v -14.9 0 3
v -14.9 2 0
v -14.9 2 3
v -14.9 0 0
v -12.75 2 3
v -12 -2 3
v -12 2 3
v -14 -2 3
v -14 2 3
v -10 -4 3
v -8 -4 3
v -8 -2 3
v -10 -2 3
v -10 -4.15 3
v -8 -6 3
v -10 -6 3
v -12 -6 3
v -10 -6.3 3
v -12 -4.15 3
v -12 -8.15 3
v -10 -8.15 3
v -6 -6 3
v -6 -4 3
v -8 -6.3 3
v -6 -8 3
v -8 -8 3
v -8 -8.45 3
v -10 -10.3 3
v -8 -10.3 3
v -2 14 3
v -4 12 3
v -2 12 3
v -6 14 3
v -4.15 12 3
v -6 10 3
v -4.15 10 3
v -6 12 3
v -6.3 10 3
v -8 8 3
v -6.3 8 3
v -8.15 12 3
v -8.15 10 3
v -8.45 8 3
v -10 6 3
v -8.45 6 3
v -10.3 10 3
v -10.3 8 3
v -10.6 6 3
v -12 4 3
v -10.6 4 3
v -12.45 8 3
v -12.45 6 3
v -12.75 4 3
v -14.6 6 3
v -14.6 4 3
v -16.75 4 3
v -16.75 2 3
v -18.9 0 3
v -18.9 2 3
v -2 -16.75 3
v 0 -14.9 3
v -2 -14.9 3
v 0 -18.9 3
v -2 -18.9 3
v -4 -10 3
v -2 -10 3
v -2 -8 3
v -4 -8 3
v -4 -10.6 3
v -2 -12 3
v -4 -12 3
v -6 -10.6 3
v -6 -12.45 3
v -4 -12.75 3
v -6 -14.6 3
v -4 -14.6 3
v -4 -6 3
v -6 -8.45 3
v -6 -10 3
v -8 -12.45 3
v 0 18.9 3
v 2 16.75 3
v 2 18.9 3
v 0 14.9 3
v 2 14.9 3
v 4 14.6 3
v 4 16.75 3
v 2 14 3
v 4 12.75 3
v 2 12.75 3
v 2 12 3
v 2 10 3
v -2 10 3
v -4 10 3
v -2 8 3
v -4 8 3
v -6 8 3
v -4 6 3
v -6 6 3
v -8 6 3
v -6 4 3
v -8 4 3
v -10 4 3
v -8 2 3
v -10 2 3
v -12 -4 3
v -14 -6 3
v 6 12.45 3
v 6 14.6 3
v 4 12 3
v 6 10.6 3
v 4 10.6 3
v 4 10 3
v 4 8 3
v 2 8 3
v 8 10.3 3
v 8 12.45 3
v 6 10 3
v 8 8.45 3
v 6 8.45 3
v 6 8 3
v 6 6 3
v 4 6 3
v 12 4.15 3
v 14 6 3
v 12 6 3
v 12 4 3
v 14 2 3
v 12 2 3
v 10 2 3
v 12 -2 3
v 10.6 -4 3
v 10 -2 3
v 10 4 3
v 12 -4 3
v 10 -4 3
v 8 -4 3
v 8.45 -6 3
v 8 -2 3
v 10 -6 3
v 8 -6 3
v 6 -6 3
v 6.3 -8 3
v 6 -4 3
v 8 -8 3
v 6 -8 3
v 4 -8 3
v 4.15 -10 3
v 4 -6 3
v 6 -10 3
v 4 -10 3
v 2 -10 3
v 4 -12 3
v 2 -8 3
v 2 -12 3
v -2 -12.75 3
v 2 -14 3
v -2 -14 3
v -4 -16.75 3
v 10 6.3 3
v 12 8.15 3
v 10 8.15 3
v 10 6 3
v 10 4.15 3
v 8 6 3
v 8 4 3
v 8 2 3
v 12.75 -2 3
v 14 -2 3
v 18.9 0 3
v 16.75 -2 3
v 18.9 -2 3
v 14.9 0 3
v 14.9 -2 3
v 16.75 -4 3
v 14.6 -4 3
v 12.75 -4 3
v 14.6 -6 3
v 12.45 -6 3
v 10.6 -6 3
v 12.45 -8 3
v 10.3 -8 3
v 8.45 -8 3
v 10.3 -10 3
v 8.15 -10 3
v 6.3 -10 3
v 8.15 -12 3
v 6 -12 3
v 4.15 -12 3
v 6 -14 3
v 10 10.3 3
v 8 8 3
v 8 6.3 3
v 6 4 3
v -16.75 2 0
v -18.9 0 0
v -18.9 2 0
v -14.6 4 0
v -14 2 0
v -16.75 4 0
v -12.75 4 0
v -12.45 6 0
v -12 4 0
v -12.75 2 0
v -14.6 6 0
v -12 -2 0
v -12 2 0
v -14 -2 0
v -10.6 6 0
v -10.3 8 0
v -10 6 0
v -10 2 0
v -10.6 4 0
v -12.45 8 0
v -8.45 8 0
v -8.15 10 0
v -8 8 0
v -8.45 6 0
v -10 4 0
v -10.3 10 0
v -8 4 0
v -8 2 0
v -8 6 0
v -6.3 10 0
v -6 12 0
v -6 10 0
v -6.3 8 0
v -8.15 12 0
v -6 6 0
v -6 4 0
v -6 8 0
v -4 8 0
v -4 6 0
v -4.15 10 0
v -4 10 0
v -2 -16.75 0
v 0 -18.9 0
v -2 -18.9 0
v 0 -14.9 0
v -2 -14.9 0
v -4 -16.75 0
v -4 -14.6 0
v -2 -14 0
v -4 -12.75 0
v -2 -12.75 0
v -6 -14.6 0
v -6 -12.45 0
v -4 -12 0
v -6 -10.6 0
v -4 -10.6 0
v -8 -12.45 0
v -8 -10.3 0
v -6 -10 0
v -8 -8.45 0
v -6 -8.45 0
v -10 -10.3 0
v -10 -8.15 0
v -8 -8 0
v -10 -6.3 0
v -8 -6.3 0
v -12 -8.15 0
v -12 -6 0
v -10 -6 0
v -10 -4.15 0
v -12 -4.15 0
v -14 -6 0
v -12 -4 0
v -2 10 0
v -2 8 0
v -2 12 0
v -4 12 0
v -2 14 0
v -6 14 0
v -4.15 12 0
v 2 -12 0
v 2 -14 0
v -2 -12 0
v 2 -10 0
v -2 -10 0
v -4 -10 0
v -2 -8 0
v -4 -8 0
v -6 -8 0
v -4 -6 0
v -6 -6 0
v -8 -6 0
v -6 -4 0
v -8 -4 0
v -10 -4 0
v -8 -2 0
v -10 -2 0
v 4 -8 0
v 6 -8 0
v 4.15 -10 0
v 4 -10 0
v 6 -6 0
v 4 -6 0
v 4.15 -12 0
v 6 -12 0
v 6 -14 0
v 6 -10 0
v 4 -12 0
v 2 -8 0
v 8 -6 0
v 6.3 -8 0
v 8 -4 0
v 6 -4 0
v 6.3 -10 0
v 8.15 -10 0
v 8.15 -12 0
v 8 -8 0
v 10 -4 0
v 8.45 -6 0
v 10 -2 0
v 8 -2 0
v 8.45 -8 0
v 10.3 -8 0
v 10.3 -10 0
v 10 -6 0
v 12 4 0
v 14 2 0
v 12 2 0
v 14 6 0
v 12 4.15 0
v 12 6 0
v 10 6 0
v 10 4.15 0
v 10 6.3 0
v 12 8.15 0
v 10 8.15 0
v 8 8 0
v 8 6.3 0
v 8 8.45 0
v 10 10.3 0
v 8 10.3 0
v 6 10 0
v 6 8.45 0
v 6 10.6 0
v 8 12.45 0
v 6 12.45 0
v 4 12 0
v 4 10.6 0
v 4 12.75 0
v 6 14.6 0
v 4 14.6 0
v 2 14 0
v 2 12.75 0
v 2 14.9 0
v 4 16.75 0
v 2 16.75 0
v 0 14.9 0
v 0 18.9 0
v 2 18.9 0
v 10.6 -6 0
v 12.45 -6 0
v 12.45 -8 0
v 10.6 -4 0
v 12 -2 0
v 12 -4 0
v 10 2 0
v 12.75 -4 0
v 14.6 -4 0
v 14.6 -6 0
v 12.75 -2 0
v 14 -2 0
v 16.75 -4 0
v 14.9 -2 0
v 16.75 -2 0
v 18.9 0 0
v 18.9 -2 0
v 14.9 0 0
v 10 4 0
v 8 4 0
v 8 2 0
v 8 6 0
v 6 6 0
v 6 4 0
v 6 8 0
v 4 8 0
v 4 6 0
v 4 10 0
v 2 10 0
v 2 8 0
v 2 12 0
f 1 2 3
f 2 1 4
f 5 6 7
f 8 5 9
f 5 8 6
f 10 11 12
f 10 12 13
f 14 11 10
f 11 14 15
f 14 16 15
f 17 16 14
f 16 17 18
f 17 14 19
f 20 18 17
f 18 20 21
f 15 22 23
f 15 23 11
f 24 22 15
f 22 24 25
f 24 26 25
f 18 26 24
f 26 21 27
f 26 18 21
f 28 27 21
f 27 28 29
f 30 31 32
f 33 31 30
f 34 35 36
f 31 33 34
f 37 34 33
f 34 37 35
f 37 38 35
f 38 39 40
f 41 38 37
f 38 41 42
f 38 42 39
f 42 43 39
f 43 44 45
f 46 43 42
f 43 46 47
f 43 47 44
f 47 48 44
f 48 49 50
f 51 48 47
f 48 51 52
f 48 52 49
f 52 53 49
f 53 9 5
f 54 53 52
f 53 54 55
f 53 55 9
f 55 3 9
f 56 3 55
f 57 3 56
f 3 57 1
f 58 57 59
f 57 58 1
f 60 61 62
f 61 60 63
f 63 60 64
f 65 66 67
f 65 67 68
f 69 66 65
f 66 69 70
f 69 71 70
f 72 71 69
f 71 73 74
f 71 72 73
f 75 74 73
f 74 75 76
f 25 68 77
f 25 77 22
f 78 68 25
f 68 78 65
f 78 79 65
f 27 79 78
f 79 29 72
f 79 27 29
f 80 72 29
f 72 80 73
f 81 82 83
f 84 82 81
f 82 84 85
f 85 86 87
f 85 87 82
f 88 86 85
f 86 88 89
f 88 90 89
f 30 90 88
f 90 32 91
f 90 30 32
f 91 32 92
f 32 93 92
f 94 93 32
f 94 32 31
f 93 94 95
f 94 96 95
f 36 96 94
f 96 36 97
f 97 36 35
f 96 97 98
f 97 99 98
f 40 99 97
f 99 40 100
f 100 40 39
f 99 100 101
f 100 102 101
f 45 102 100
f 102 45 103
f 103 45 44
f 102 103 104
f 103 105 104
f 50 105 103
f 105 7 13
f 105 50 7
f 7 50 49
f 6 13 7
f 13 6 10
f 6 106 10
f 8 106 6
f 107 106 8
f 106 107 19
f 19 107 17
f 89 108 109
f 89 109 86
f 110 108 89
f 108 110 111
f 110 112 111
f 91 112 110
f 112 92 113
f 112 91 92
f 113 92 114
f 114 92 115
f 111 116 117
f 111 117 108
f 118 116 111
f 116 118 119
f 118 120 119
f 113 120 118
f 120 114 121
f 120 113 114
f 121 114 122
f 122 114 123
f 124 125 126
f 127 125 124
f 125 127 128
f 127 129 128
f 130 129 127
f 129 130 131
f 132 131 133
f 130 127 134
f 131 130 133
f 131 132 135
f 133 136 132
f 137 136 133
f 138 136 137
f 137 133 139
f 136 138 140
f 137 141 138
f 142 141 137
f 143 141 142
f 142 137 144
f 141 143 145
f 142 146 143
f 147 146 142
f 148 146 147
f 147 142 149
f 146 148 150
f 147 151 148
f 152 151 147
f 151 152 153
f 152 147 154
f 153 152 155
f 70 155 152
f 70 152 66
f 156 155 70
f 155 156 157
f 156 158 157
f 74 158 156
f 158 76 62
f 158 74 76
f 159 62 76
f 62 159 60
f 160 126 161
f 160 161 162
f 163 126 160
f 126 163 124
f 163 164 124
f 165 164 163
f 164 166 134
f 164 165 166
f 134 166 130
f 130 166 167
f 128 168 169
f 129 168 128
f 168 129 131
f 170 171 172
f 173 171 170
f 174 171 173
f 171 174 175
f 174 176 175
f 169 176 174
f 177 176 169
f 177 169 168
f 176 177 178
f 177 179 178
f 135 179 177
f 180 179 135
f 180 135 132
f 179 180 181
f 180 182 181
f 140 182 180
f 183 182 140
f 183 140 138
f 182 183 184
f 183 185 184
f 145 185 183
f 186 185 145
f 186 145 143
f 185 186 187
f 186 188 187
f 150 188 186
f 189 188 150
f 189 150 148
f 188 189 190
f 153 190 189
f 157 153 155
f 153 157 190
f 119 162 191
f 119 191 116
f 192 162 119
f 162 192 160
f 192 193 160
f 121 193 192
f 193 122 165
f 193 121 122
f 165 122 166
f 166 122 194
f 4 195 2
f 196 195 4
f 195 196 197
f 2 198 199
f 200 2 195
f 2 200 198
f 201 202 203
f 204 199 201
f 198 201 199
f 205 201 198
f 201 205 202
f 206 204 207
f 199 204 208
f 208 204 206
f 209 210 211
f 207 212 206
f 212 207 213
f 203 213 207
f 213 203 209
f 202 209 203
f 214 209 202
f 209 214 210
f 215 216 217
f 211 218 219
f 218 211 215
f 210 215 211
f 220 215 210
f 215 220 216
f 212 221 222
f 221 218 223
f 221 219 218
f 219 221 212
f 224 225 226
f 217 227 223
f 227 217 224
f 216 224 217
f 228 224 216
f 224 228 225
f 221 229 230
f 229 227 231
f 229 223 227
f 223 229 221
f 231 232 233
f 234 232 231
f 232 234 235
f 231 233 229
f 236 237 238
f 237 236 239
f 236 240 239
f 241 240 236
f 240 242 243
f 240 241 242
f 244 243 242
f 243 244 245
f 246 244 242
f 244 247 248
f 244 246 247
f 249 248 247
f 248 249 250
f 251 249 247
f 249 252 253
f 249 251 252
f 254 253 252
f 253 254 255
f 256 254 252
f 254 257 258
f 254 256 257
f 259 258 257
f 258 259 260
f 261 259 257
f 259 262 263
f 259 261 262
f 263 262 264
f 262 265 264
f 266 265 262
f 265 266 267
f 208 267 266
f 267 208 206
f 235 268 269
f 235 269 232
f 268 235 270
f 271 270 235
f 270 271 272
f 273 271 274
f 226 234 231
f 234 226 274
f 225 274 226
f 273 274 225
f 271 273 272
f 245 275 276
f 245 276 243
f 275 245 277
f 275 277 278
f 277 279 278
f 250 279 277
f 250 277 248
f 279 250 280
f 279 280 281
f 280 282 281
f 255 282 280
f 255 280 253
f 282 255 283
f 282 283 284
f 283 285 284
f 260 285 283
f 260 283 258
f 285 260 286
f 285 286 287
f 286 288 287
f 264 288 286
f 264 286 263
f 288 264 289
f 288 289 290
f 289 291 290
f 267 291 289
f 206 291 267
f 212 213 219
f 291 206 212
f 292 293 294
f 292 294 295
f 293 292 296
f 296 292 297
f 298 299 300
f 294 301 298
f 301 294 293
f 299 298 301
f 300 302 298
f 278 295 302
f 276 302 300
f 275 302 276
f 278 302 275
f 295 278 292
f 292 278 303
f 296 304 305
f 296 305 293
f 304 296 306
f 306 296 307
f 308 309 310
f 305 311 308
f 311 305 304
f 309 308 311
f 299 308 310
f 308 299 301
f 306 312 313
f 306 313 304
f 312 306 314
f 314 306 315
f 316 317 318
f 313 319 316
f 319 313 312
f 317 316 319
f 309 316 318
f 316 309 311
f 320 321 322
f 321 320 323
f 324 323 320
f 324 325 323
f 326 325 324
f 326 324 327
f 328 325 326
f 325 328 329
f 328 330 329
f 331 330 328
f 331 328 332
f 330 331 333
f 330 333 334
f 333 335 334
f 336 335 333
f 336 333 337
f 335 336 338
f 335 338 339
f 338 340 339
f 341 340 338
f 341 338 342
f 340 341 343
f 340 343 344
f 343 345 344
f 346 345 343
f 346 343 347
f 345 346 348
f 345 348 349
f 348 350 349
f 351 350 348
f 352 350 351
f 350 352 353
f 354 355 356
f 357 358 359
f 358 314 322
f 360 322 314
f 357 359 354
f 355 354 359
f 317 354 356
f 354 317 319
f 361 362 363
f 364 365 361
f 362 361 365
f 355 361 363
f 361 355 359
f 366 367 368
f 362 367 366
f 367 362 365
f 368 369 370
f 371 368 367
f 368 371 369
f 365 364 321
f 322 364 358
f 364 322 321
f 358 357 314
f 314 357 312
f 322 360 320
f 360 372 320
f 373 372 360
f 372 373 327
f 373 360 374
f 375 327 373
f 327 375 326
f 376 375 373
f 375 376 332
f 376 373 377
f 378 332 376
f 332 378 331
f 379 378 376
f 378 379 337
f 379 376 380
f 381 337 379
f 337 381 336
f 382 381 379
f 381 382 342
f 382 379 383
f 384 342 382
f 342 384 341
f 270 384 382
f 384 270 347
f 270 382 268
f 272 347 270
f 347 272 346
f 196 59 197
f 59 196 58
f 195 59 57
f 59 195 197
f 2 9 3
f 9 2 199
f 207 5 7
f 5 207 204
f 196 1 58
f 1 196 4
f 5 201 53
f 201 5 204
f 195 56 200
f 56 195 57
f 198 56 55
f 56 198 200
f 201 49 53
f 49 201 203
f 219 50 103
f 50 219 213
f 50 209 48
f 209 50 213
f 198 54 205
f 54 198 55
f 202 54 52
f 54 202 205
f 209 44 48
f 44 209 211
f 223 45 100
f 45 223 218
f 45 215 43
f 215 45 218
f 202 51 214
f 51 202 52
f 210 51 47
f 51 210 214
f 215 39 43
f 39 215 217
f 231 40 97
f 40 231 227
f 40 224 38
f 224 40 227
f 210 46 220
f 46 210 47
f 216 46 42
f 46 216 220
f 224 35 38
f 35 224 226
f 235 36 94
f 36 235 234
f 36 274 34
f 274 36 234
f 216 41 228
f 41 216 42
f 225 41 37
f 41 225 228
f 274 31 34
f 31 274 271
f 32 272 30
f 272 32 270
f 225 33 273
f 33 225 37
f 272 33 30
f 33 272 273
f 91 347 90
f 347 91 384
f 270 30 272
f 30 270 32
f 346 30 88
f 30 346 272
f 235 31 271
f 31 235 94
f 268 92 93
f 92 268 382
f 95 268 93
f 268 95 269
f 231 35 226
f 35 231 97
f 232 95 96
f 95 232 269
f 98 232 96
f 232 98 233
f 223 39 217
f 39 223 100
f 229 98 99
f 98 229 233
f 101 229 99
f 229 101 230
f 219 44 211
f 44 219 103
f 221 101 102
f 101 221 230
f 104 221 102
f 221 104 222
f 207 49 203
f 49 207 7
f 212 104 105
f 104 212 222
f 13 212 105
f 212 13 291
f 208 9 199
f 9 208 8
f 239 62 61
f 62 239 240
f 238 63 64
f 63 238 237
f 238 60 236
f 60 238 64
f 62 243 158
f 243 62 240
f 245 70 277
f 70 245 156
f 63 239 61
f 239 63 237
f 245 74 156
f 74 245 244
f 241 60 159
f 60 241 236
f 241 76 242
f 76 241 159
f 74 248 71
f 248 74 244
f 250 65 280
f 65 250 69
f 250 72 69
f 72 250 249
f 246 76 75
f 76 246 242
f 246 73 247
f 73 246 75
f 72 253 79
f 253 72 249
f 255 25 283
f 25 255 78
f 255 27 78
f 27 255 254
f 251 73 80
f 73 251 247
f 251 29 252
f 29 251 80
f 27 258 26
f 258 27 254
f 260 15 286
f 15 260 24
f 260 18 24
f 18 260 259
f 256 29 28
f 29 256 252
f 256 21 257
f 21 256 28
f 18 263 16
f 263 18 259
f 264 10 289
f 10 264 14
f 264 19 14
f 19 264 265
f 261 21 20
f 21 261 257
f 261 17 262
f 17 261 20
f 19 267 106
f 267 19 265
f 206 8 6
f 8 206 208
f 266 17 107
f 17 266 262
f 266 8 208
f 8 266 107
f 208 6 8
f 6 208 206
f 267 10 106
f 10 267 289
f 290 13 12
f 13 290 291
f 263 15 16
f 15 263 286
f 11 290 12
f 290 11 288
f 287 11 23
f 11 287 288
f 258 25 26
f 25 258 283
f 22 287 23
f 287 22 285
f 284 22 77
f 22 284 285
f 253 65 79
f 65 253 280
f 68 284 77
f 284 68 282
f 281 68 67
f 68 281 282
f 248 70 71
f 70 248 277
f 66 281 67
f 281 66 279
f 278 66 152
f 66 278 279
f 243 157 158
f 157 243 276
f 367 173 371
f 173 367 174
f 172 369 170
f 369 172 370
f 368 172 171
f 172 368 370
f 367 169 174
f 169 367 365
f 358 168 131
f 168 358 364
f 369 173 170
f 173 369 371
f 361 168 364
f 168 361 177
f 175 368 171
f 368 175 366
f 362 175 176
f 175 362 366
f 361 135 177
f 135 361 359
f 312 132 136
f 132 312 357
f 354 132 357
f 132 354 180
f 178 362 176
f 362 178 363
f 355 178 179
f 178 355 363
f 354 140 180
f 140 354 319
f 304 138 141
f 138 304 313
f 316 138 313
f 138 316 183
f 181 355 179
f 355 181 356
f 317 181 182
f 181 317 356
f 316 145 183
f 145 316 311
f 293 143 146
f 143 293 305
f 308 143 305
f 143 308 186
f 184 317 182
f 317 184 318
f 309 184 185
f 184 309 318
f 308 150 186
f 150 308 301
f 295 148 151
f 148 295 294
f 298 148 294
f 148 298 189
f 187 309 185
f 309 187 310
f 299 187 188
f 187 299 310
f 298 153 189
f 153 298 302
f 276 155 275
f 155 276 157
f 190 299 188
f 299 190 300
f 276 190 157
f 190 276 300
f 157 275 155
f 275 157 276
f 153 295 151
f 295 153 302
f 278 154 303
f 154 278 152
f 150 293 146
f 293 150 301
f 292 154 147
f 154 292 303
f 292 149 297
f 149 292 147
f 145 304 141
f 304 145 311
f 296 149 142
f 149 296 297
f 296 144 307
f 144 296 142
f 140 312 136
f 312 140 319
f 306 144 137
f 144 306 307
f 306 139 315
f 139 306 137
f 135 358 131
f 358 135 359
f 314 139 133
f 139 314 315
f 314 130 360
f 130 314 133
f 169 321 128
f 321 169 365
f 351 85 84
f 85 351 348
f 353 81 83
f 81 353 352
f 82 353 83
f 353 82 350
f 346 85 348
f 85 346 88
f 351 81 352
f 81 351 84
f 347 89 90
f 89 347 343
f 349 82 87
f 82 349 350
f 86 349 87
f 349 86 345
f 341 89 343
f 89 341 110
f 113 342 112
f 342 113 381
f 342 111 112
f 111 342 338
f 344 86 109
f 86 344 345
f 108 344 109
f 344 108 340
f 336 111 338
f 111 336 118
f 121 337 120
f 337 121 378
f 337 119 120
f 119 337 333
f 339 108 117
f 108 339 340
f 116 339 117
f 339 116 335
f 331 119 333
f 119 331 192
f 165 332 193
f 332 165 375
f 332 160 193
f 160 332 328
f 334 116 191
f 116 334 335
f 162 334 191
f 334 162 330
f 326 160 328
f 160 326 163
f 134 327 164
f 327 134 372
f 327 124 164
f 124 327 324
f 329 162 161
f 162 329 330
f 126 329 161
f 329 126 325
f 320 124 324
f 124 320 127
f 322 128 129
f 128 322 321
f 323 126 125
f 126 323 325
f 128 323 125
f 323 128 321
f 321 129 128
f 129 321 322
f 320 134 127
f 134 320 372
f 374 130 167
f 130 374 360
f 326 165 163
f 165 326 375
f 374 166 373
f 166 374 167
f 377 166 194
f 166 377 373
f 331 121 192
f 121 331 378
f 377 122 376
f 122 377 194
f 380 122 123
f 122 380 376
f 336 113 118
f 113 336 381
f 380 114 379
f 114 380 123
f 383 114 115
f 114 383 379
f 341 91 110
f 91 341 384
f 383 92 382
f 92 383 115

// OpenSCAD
steps = 7;
stepsize = 2;
gapdelta = 0.15;
height = 3;

union() {
    for (a = [0:3]) {
        rotate([0,0,90*a]) {
            translate([-(steps+1)*(stepsize+gapdelta)+gapdelta,-stepsize,0]) {
               
                color("Gray", 1) {
                    union() {
                        for (dx = [1:steps]) {
                            translate([(dx-2)*(stepsize+gapdelta)+2*gapdelta,dx*stepsize,0]) {
//                                cube([dx*(stepsize+gapdelta),stepsize,height]);
                                cube([stepsize*2,stepsize,height]);
                            }
                        }
                    }
                    
                }
               
            }
            translate([0,-stepsize,0]) {

                color("Red", 1) {
                    union() {
                        for (dx = [1:steps]) {
                            translate([-dx*stepsize,stepsize*steps-(dx-1)*stepsize,0]) {
//                                cube([dx*stepsize,stepsize,height]);
                                cube([2*stepsize,stepsize,height]);
                            }
                        }
                    }
                }

            }
        }
    }
}
